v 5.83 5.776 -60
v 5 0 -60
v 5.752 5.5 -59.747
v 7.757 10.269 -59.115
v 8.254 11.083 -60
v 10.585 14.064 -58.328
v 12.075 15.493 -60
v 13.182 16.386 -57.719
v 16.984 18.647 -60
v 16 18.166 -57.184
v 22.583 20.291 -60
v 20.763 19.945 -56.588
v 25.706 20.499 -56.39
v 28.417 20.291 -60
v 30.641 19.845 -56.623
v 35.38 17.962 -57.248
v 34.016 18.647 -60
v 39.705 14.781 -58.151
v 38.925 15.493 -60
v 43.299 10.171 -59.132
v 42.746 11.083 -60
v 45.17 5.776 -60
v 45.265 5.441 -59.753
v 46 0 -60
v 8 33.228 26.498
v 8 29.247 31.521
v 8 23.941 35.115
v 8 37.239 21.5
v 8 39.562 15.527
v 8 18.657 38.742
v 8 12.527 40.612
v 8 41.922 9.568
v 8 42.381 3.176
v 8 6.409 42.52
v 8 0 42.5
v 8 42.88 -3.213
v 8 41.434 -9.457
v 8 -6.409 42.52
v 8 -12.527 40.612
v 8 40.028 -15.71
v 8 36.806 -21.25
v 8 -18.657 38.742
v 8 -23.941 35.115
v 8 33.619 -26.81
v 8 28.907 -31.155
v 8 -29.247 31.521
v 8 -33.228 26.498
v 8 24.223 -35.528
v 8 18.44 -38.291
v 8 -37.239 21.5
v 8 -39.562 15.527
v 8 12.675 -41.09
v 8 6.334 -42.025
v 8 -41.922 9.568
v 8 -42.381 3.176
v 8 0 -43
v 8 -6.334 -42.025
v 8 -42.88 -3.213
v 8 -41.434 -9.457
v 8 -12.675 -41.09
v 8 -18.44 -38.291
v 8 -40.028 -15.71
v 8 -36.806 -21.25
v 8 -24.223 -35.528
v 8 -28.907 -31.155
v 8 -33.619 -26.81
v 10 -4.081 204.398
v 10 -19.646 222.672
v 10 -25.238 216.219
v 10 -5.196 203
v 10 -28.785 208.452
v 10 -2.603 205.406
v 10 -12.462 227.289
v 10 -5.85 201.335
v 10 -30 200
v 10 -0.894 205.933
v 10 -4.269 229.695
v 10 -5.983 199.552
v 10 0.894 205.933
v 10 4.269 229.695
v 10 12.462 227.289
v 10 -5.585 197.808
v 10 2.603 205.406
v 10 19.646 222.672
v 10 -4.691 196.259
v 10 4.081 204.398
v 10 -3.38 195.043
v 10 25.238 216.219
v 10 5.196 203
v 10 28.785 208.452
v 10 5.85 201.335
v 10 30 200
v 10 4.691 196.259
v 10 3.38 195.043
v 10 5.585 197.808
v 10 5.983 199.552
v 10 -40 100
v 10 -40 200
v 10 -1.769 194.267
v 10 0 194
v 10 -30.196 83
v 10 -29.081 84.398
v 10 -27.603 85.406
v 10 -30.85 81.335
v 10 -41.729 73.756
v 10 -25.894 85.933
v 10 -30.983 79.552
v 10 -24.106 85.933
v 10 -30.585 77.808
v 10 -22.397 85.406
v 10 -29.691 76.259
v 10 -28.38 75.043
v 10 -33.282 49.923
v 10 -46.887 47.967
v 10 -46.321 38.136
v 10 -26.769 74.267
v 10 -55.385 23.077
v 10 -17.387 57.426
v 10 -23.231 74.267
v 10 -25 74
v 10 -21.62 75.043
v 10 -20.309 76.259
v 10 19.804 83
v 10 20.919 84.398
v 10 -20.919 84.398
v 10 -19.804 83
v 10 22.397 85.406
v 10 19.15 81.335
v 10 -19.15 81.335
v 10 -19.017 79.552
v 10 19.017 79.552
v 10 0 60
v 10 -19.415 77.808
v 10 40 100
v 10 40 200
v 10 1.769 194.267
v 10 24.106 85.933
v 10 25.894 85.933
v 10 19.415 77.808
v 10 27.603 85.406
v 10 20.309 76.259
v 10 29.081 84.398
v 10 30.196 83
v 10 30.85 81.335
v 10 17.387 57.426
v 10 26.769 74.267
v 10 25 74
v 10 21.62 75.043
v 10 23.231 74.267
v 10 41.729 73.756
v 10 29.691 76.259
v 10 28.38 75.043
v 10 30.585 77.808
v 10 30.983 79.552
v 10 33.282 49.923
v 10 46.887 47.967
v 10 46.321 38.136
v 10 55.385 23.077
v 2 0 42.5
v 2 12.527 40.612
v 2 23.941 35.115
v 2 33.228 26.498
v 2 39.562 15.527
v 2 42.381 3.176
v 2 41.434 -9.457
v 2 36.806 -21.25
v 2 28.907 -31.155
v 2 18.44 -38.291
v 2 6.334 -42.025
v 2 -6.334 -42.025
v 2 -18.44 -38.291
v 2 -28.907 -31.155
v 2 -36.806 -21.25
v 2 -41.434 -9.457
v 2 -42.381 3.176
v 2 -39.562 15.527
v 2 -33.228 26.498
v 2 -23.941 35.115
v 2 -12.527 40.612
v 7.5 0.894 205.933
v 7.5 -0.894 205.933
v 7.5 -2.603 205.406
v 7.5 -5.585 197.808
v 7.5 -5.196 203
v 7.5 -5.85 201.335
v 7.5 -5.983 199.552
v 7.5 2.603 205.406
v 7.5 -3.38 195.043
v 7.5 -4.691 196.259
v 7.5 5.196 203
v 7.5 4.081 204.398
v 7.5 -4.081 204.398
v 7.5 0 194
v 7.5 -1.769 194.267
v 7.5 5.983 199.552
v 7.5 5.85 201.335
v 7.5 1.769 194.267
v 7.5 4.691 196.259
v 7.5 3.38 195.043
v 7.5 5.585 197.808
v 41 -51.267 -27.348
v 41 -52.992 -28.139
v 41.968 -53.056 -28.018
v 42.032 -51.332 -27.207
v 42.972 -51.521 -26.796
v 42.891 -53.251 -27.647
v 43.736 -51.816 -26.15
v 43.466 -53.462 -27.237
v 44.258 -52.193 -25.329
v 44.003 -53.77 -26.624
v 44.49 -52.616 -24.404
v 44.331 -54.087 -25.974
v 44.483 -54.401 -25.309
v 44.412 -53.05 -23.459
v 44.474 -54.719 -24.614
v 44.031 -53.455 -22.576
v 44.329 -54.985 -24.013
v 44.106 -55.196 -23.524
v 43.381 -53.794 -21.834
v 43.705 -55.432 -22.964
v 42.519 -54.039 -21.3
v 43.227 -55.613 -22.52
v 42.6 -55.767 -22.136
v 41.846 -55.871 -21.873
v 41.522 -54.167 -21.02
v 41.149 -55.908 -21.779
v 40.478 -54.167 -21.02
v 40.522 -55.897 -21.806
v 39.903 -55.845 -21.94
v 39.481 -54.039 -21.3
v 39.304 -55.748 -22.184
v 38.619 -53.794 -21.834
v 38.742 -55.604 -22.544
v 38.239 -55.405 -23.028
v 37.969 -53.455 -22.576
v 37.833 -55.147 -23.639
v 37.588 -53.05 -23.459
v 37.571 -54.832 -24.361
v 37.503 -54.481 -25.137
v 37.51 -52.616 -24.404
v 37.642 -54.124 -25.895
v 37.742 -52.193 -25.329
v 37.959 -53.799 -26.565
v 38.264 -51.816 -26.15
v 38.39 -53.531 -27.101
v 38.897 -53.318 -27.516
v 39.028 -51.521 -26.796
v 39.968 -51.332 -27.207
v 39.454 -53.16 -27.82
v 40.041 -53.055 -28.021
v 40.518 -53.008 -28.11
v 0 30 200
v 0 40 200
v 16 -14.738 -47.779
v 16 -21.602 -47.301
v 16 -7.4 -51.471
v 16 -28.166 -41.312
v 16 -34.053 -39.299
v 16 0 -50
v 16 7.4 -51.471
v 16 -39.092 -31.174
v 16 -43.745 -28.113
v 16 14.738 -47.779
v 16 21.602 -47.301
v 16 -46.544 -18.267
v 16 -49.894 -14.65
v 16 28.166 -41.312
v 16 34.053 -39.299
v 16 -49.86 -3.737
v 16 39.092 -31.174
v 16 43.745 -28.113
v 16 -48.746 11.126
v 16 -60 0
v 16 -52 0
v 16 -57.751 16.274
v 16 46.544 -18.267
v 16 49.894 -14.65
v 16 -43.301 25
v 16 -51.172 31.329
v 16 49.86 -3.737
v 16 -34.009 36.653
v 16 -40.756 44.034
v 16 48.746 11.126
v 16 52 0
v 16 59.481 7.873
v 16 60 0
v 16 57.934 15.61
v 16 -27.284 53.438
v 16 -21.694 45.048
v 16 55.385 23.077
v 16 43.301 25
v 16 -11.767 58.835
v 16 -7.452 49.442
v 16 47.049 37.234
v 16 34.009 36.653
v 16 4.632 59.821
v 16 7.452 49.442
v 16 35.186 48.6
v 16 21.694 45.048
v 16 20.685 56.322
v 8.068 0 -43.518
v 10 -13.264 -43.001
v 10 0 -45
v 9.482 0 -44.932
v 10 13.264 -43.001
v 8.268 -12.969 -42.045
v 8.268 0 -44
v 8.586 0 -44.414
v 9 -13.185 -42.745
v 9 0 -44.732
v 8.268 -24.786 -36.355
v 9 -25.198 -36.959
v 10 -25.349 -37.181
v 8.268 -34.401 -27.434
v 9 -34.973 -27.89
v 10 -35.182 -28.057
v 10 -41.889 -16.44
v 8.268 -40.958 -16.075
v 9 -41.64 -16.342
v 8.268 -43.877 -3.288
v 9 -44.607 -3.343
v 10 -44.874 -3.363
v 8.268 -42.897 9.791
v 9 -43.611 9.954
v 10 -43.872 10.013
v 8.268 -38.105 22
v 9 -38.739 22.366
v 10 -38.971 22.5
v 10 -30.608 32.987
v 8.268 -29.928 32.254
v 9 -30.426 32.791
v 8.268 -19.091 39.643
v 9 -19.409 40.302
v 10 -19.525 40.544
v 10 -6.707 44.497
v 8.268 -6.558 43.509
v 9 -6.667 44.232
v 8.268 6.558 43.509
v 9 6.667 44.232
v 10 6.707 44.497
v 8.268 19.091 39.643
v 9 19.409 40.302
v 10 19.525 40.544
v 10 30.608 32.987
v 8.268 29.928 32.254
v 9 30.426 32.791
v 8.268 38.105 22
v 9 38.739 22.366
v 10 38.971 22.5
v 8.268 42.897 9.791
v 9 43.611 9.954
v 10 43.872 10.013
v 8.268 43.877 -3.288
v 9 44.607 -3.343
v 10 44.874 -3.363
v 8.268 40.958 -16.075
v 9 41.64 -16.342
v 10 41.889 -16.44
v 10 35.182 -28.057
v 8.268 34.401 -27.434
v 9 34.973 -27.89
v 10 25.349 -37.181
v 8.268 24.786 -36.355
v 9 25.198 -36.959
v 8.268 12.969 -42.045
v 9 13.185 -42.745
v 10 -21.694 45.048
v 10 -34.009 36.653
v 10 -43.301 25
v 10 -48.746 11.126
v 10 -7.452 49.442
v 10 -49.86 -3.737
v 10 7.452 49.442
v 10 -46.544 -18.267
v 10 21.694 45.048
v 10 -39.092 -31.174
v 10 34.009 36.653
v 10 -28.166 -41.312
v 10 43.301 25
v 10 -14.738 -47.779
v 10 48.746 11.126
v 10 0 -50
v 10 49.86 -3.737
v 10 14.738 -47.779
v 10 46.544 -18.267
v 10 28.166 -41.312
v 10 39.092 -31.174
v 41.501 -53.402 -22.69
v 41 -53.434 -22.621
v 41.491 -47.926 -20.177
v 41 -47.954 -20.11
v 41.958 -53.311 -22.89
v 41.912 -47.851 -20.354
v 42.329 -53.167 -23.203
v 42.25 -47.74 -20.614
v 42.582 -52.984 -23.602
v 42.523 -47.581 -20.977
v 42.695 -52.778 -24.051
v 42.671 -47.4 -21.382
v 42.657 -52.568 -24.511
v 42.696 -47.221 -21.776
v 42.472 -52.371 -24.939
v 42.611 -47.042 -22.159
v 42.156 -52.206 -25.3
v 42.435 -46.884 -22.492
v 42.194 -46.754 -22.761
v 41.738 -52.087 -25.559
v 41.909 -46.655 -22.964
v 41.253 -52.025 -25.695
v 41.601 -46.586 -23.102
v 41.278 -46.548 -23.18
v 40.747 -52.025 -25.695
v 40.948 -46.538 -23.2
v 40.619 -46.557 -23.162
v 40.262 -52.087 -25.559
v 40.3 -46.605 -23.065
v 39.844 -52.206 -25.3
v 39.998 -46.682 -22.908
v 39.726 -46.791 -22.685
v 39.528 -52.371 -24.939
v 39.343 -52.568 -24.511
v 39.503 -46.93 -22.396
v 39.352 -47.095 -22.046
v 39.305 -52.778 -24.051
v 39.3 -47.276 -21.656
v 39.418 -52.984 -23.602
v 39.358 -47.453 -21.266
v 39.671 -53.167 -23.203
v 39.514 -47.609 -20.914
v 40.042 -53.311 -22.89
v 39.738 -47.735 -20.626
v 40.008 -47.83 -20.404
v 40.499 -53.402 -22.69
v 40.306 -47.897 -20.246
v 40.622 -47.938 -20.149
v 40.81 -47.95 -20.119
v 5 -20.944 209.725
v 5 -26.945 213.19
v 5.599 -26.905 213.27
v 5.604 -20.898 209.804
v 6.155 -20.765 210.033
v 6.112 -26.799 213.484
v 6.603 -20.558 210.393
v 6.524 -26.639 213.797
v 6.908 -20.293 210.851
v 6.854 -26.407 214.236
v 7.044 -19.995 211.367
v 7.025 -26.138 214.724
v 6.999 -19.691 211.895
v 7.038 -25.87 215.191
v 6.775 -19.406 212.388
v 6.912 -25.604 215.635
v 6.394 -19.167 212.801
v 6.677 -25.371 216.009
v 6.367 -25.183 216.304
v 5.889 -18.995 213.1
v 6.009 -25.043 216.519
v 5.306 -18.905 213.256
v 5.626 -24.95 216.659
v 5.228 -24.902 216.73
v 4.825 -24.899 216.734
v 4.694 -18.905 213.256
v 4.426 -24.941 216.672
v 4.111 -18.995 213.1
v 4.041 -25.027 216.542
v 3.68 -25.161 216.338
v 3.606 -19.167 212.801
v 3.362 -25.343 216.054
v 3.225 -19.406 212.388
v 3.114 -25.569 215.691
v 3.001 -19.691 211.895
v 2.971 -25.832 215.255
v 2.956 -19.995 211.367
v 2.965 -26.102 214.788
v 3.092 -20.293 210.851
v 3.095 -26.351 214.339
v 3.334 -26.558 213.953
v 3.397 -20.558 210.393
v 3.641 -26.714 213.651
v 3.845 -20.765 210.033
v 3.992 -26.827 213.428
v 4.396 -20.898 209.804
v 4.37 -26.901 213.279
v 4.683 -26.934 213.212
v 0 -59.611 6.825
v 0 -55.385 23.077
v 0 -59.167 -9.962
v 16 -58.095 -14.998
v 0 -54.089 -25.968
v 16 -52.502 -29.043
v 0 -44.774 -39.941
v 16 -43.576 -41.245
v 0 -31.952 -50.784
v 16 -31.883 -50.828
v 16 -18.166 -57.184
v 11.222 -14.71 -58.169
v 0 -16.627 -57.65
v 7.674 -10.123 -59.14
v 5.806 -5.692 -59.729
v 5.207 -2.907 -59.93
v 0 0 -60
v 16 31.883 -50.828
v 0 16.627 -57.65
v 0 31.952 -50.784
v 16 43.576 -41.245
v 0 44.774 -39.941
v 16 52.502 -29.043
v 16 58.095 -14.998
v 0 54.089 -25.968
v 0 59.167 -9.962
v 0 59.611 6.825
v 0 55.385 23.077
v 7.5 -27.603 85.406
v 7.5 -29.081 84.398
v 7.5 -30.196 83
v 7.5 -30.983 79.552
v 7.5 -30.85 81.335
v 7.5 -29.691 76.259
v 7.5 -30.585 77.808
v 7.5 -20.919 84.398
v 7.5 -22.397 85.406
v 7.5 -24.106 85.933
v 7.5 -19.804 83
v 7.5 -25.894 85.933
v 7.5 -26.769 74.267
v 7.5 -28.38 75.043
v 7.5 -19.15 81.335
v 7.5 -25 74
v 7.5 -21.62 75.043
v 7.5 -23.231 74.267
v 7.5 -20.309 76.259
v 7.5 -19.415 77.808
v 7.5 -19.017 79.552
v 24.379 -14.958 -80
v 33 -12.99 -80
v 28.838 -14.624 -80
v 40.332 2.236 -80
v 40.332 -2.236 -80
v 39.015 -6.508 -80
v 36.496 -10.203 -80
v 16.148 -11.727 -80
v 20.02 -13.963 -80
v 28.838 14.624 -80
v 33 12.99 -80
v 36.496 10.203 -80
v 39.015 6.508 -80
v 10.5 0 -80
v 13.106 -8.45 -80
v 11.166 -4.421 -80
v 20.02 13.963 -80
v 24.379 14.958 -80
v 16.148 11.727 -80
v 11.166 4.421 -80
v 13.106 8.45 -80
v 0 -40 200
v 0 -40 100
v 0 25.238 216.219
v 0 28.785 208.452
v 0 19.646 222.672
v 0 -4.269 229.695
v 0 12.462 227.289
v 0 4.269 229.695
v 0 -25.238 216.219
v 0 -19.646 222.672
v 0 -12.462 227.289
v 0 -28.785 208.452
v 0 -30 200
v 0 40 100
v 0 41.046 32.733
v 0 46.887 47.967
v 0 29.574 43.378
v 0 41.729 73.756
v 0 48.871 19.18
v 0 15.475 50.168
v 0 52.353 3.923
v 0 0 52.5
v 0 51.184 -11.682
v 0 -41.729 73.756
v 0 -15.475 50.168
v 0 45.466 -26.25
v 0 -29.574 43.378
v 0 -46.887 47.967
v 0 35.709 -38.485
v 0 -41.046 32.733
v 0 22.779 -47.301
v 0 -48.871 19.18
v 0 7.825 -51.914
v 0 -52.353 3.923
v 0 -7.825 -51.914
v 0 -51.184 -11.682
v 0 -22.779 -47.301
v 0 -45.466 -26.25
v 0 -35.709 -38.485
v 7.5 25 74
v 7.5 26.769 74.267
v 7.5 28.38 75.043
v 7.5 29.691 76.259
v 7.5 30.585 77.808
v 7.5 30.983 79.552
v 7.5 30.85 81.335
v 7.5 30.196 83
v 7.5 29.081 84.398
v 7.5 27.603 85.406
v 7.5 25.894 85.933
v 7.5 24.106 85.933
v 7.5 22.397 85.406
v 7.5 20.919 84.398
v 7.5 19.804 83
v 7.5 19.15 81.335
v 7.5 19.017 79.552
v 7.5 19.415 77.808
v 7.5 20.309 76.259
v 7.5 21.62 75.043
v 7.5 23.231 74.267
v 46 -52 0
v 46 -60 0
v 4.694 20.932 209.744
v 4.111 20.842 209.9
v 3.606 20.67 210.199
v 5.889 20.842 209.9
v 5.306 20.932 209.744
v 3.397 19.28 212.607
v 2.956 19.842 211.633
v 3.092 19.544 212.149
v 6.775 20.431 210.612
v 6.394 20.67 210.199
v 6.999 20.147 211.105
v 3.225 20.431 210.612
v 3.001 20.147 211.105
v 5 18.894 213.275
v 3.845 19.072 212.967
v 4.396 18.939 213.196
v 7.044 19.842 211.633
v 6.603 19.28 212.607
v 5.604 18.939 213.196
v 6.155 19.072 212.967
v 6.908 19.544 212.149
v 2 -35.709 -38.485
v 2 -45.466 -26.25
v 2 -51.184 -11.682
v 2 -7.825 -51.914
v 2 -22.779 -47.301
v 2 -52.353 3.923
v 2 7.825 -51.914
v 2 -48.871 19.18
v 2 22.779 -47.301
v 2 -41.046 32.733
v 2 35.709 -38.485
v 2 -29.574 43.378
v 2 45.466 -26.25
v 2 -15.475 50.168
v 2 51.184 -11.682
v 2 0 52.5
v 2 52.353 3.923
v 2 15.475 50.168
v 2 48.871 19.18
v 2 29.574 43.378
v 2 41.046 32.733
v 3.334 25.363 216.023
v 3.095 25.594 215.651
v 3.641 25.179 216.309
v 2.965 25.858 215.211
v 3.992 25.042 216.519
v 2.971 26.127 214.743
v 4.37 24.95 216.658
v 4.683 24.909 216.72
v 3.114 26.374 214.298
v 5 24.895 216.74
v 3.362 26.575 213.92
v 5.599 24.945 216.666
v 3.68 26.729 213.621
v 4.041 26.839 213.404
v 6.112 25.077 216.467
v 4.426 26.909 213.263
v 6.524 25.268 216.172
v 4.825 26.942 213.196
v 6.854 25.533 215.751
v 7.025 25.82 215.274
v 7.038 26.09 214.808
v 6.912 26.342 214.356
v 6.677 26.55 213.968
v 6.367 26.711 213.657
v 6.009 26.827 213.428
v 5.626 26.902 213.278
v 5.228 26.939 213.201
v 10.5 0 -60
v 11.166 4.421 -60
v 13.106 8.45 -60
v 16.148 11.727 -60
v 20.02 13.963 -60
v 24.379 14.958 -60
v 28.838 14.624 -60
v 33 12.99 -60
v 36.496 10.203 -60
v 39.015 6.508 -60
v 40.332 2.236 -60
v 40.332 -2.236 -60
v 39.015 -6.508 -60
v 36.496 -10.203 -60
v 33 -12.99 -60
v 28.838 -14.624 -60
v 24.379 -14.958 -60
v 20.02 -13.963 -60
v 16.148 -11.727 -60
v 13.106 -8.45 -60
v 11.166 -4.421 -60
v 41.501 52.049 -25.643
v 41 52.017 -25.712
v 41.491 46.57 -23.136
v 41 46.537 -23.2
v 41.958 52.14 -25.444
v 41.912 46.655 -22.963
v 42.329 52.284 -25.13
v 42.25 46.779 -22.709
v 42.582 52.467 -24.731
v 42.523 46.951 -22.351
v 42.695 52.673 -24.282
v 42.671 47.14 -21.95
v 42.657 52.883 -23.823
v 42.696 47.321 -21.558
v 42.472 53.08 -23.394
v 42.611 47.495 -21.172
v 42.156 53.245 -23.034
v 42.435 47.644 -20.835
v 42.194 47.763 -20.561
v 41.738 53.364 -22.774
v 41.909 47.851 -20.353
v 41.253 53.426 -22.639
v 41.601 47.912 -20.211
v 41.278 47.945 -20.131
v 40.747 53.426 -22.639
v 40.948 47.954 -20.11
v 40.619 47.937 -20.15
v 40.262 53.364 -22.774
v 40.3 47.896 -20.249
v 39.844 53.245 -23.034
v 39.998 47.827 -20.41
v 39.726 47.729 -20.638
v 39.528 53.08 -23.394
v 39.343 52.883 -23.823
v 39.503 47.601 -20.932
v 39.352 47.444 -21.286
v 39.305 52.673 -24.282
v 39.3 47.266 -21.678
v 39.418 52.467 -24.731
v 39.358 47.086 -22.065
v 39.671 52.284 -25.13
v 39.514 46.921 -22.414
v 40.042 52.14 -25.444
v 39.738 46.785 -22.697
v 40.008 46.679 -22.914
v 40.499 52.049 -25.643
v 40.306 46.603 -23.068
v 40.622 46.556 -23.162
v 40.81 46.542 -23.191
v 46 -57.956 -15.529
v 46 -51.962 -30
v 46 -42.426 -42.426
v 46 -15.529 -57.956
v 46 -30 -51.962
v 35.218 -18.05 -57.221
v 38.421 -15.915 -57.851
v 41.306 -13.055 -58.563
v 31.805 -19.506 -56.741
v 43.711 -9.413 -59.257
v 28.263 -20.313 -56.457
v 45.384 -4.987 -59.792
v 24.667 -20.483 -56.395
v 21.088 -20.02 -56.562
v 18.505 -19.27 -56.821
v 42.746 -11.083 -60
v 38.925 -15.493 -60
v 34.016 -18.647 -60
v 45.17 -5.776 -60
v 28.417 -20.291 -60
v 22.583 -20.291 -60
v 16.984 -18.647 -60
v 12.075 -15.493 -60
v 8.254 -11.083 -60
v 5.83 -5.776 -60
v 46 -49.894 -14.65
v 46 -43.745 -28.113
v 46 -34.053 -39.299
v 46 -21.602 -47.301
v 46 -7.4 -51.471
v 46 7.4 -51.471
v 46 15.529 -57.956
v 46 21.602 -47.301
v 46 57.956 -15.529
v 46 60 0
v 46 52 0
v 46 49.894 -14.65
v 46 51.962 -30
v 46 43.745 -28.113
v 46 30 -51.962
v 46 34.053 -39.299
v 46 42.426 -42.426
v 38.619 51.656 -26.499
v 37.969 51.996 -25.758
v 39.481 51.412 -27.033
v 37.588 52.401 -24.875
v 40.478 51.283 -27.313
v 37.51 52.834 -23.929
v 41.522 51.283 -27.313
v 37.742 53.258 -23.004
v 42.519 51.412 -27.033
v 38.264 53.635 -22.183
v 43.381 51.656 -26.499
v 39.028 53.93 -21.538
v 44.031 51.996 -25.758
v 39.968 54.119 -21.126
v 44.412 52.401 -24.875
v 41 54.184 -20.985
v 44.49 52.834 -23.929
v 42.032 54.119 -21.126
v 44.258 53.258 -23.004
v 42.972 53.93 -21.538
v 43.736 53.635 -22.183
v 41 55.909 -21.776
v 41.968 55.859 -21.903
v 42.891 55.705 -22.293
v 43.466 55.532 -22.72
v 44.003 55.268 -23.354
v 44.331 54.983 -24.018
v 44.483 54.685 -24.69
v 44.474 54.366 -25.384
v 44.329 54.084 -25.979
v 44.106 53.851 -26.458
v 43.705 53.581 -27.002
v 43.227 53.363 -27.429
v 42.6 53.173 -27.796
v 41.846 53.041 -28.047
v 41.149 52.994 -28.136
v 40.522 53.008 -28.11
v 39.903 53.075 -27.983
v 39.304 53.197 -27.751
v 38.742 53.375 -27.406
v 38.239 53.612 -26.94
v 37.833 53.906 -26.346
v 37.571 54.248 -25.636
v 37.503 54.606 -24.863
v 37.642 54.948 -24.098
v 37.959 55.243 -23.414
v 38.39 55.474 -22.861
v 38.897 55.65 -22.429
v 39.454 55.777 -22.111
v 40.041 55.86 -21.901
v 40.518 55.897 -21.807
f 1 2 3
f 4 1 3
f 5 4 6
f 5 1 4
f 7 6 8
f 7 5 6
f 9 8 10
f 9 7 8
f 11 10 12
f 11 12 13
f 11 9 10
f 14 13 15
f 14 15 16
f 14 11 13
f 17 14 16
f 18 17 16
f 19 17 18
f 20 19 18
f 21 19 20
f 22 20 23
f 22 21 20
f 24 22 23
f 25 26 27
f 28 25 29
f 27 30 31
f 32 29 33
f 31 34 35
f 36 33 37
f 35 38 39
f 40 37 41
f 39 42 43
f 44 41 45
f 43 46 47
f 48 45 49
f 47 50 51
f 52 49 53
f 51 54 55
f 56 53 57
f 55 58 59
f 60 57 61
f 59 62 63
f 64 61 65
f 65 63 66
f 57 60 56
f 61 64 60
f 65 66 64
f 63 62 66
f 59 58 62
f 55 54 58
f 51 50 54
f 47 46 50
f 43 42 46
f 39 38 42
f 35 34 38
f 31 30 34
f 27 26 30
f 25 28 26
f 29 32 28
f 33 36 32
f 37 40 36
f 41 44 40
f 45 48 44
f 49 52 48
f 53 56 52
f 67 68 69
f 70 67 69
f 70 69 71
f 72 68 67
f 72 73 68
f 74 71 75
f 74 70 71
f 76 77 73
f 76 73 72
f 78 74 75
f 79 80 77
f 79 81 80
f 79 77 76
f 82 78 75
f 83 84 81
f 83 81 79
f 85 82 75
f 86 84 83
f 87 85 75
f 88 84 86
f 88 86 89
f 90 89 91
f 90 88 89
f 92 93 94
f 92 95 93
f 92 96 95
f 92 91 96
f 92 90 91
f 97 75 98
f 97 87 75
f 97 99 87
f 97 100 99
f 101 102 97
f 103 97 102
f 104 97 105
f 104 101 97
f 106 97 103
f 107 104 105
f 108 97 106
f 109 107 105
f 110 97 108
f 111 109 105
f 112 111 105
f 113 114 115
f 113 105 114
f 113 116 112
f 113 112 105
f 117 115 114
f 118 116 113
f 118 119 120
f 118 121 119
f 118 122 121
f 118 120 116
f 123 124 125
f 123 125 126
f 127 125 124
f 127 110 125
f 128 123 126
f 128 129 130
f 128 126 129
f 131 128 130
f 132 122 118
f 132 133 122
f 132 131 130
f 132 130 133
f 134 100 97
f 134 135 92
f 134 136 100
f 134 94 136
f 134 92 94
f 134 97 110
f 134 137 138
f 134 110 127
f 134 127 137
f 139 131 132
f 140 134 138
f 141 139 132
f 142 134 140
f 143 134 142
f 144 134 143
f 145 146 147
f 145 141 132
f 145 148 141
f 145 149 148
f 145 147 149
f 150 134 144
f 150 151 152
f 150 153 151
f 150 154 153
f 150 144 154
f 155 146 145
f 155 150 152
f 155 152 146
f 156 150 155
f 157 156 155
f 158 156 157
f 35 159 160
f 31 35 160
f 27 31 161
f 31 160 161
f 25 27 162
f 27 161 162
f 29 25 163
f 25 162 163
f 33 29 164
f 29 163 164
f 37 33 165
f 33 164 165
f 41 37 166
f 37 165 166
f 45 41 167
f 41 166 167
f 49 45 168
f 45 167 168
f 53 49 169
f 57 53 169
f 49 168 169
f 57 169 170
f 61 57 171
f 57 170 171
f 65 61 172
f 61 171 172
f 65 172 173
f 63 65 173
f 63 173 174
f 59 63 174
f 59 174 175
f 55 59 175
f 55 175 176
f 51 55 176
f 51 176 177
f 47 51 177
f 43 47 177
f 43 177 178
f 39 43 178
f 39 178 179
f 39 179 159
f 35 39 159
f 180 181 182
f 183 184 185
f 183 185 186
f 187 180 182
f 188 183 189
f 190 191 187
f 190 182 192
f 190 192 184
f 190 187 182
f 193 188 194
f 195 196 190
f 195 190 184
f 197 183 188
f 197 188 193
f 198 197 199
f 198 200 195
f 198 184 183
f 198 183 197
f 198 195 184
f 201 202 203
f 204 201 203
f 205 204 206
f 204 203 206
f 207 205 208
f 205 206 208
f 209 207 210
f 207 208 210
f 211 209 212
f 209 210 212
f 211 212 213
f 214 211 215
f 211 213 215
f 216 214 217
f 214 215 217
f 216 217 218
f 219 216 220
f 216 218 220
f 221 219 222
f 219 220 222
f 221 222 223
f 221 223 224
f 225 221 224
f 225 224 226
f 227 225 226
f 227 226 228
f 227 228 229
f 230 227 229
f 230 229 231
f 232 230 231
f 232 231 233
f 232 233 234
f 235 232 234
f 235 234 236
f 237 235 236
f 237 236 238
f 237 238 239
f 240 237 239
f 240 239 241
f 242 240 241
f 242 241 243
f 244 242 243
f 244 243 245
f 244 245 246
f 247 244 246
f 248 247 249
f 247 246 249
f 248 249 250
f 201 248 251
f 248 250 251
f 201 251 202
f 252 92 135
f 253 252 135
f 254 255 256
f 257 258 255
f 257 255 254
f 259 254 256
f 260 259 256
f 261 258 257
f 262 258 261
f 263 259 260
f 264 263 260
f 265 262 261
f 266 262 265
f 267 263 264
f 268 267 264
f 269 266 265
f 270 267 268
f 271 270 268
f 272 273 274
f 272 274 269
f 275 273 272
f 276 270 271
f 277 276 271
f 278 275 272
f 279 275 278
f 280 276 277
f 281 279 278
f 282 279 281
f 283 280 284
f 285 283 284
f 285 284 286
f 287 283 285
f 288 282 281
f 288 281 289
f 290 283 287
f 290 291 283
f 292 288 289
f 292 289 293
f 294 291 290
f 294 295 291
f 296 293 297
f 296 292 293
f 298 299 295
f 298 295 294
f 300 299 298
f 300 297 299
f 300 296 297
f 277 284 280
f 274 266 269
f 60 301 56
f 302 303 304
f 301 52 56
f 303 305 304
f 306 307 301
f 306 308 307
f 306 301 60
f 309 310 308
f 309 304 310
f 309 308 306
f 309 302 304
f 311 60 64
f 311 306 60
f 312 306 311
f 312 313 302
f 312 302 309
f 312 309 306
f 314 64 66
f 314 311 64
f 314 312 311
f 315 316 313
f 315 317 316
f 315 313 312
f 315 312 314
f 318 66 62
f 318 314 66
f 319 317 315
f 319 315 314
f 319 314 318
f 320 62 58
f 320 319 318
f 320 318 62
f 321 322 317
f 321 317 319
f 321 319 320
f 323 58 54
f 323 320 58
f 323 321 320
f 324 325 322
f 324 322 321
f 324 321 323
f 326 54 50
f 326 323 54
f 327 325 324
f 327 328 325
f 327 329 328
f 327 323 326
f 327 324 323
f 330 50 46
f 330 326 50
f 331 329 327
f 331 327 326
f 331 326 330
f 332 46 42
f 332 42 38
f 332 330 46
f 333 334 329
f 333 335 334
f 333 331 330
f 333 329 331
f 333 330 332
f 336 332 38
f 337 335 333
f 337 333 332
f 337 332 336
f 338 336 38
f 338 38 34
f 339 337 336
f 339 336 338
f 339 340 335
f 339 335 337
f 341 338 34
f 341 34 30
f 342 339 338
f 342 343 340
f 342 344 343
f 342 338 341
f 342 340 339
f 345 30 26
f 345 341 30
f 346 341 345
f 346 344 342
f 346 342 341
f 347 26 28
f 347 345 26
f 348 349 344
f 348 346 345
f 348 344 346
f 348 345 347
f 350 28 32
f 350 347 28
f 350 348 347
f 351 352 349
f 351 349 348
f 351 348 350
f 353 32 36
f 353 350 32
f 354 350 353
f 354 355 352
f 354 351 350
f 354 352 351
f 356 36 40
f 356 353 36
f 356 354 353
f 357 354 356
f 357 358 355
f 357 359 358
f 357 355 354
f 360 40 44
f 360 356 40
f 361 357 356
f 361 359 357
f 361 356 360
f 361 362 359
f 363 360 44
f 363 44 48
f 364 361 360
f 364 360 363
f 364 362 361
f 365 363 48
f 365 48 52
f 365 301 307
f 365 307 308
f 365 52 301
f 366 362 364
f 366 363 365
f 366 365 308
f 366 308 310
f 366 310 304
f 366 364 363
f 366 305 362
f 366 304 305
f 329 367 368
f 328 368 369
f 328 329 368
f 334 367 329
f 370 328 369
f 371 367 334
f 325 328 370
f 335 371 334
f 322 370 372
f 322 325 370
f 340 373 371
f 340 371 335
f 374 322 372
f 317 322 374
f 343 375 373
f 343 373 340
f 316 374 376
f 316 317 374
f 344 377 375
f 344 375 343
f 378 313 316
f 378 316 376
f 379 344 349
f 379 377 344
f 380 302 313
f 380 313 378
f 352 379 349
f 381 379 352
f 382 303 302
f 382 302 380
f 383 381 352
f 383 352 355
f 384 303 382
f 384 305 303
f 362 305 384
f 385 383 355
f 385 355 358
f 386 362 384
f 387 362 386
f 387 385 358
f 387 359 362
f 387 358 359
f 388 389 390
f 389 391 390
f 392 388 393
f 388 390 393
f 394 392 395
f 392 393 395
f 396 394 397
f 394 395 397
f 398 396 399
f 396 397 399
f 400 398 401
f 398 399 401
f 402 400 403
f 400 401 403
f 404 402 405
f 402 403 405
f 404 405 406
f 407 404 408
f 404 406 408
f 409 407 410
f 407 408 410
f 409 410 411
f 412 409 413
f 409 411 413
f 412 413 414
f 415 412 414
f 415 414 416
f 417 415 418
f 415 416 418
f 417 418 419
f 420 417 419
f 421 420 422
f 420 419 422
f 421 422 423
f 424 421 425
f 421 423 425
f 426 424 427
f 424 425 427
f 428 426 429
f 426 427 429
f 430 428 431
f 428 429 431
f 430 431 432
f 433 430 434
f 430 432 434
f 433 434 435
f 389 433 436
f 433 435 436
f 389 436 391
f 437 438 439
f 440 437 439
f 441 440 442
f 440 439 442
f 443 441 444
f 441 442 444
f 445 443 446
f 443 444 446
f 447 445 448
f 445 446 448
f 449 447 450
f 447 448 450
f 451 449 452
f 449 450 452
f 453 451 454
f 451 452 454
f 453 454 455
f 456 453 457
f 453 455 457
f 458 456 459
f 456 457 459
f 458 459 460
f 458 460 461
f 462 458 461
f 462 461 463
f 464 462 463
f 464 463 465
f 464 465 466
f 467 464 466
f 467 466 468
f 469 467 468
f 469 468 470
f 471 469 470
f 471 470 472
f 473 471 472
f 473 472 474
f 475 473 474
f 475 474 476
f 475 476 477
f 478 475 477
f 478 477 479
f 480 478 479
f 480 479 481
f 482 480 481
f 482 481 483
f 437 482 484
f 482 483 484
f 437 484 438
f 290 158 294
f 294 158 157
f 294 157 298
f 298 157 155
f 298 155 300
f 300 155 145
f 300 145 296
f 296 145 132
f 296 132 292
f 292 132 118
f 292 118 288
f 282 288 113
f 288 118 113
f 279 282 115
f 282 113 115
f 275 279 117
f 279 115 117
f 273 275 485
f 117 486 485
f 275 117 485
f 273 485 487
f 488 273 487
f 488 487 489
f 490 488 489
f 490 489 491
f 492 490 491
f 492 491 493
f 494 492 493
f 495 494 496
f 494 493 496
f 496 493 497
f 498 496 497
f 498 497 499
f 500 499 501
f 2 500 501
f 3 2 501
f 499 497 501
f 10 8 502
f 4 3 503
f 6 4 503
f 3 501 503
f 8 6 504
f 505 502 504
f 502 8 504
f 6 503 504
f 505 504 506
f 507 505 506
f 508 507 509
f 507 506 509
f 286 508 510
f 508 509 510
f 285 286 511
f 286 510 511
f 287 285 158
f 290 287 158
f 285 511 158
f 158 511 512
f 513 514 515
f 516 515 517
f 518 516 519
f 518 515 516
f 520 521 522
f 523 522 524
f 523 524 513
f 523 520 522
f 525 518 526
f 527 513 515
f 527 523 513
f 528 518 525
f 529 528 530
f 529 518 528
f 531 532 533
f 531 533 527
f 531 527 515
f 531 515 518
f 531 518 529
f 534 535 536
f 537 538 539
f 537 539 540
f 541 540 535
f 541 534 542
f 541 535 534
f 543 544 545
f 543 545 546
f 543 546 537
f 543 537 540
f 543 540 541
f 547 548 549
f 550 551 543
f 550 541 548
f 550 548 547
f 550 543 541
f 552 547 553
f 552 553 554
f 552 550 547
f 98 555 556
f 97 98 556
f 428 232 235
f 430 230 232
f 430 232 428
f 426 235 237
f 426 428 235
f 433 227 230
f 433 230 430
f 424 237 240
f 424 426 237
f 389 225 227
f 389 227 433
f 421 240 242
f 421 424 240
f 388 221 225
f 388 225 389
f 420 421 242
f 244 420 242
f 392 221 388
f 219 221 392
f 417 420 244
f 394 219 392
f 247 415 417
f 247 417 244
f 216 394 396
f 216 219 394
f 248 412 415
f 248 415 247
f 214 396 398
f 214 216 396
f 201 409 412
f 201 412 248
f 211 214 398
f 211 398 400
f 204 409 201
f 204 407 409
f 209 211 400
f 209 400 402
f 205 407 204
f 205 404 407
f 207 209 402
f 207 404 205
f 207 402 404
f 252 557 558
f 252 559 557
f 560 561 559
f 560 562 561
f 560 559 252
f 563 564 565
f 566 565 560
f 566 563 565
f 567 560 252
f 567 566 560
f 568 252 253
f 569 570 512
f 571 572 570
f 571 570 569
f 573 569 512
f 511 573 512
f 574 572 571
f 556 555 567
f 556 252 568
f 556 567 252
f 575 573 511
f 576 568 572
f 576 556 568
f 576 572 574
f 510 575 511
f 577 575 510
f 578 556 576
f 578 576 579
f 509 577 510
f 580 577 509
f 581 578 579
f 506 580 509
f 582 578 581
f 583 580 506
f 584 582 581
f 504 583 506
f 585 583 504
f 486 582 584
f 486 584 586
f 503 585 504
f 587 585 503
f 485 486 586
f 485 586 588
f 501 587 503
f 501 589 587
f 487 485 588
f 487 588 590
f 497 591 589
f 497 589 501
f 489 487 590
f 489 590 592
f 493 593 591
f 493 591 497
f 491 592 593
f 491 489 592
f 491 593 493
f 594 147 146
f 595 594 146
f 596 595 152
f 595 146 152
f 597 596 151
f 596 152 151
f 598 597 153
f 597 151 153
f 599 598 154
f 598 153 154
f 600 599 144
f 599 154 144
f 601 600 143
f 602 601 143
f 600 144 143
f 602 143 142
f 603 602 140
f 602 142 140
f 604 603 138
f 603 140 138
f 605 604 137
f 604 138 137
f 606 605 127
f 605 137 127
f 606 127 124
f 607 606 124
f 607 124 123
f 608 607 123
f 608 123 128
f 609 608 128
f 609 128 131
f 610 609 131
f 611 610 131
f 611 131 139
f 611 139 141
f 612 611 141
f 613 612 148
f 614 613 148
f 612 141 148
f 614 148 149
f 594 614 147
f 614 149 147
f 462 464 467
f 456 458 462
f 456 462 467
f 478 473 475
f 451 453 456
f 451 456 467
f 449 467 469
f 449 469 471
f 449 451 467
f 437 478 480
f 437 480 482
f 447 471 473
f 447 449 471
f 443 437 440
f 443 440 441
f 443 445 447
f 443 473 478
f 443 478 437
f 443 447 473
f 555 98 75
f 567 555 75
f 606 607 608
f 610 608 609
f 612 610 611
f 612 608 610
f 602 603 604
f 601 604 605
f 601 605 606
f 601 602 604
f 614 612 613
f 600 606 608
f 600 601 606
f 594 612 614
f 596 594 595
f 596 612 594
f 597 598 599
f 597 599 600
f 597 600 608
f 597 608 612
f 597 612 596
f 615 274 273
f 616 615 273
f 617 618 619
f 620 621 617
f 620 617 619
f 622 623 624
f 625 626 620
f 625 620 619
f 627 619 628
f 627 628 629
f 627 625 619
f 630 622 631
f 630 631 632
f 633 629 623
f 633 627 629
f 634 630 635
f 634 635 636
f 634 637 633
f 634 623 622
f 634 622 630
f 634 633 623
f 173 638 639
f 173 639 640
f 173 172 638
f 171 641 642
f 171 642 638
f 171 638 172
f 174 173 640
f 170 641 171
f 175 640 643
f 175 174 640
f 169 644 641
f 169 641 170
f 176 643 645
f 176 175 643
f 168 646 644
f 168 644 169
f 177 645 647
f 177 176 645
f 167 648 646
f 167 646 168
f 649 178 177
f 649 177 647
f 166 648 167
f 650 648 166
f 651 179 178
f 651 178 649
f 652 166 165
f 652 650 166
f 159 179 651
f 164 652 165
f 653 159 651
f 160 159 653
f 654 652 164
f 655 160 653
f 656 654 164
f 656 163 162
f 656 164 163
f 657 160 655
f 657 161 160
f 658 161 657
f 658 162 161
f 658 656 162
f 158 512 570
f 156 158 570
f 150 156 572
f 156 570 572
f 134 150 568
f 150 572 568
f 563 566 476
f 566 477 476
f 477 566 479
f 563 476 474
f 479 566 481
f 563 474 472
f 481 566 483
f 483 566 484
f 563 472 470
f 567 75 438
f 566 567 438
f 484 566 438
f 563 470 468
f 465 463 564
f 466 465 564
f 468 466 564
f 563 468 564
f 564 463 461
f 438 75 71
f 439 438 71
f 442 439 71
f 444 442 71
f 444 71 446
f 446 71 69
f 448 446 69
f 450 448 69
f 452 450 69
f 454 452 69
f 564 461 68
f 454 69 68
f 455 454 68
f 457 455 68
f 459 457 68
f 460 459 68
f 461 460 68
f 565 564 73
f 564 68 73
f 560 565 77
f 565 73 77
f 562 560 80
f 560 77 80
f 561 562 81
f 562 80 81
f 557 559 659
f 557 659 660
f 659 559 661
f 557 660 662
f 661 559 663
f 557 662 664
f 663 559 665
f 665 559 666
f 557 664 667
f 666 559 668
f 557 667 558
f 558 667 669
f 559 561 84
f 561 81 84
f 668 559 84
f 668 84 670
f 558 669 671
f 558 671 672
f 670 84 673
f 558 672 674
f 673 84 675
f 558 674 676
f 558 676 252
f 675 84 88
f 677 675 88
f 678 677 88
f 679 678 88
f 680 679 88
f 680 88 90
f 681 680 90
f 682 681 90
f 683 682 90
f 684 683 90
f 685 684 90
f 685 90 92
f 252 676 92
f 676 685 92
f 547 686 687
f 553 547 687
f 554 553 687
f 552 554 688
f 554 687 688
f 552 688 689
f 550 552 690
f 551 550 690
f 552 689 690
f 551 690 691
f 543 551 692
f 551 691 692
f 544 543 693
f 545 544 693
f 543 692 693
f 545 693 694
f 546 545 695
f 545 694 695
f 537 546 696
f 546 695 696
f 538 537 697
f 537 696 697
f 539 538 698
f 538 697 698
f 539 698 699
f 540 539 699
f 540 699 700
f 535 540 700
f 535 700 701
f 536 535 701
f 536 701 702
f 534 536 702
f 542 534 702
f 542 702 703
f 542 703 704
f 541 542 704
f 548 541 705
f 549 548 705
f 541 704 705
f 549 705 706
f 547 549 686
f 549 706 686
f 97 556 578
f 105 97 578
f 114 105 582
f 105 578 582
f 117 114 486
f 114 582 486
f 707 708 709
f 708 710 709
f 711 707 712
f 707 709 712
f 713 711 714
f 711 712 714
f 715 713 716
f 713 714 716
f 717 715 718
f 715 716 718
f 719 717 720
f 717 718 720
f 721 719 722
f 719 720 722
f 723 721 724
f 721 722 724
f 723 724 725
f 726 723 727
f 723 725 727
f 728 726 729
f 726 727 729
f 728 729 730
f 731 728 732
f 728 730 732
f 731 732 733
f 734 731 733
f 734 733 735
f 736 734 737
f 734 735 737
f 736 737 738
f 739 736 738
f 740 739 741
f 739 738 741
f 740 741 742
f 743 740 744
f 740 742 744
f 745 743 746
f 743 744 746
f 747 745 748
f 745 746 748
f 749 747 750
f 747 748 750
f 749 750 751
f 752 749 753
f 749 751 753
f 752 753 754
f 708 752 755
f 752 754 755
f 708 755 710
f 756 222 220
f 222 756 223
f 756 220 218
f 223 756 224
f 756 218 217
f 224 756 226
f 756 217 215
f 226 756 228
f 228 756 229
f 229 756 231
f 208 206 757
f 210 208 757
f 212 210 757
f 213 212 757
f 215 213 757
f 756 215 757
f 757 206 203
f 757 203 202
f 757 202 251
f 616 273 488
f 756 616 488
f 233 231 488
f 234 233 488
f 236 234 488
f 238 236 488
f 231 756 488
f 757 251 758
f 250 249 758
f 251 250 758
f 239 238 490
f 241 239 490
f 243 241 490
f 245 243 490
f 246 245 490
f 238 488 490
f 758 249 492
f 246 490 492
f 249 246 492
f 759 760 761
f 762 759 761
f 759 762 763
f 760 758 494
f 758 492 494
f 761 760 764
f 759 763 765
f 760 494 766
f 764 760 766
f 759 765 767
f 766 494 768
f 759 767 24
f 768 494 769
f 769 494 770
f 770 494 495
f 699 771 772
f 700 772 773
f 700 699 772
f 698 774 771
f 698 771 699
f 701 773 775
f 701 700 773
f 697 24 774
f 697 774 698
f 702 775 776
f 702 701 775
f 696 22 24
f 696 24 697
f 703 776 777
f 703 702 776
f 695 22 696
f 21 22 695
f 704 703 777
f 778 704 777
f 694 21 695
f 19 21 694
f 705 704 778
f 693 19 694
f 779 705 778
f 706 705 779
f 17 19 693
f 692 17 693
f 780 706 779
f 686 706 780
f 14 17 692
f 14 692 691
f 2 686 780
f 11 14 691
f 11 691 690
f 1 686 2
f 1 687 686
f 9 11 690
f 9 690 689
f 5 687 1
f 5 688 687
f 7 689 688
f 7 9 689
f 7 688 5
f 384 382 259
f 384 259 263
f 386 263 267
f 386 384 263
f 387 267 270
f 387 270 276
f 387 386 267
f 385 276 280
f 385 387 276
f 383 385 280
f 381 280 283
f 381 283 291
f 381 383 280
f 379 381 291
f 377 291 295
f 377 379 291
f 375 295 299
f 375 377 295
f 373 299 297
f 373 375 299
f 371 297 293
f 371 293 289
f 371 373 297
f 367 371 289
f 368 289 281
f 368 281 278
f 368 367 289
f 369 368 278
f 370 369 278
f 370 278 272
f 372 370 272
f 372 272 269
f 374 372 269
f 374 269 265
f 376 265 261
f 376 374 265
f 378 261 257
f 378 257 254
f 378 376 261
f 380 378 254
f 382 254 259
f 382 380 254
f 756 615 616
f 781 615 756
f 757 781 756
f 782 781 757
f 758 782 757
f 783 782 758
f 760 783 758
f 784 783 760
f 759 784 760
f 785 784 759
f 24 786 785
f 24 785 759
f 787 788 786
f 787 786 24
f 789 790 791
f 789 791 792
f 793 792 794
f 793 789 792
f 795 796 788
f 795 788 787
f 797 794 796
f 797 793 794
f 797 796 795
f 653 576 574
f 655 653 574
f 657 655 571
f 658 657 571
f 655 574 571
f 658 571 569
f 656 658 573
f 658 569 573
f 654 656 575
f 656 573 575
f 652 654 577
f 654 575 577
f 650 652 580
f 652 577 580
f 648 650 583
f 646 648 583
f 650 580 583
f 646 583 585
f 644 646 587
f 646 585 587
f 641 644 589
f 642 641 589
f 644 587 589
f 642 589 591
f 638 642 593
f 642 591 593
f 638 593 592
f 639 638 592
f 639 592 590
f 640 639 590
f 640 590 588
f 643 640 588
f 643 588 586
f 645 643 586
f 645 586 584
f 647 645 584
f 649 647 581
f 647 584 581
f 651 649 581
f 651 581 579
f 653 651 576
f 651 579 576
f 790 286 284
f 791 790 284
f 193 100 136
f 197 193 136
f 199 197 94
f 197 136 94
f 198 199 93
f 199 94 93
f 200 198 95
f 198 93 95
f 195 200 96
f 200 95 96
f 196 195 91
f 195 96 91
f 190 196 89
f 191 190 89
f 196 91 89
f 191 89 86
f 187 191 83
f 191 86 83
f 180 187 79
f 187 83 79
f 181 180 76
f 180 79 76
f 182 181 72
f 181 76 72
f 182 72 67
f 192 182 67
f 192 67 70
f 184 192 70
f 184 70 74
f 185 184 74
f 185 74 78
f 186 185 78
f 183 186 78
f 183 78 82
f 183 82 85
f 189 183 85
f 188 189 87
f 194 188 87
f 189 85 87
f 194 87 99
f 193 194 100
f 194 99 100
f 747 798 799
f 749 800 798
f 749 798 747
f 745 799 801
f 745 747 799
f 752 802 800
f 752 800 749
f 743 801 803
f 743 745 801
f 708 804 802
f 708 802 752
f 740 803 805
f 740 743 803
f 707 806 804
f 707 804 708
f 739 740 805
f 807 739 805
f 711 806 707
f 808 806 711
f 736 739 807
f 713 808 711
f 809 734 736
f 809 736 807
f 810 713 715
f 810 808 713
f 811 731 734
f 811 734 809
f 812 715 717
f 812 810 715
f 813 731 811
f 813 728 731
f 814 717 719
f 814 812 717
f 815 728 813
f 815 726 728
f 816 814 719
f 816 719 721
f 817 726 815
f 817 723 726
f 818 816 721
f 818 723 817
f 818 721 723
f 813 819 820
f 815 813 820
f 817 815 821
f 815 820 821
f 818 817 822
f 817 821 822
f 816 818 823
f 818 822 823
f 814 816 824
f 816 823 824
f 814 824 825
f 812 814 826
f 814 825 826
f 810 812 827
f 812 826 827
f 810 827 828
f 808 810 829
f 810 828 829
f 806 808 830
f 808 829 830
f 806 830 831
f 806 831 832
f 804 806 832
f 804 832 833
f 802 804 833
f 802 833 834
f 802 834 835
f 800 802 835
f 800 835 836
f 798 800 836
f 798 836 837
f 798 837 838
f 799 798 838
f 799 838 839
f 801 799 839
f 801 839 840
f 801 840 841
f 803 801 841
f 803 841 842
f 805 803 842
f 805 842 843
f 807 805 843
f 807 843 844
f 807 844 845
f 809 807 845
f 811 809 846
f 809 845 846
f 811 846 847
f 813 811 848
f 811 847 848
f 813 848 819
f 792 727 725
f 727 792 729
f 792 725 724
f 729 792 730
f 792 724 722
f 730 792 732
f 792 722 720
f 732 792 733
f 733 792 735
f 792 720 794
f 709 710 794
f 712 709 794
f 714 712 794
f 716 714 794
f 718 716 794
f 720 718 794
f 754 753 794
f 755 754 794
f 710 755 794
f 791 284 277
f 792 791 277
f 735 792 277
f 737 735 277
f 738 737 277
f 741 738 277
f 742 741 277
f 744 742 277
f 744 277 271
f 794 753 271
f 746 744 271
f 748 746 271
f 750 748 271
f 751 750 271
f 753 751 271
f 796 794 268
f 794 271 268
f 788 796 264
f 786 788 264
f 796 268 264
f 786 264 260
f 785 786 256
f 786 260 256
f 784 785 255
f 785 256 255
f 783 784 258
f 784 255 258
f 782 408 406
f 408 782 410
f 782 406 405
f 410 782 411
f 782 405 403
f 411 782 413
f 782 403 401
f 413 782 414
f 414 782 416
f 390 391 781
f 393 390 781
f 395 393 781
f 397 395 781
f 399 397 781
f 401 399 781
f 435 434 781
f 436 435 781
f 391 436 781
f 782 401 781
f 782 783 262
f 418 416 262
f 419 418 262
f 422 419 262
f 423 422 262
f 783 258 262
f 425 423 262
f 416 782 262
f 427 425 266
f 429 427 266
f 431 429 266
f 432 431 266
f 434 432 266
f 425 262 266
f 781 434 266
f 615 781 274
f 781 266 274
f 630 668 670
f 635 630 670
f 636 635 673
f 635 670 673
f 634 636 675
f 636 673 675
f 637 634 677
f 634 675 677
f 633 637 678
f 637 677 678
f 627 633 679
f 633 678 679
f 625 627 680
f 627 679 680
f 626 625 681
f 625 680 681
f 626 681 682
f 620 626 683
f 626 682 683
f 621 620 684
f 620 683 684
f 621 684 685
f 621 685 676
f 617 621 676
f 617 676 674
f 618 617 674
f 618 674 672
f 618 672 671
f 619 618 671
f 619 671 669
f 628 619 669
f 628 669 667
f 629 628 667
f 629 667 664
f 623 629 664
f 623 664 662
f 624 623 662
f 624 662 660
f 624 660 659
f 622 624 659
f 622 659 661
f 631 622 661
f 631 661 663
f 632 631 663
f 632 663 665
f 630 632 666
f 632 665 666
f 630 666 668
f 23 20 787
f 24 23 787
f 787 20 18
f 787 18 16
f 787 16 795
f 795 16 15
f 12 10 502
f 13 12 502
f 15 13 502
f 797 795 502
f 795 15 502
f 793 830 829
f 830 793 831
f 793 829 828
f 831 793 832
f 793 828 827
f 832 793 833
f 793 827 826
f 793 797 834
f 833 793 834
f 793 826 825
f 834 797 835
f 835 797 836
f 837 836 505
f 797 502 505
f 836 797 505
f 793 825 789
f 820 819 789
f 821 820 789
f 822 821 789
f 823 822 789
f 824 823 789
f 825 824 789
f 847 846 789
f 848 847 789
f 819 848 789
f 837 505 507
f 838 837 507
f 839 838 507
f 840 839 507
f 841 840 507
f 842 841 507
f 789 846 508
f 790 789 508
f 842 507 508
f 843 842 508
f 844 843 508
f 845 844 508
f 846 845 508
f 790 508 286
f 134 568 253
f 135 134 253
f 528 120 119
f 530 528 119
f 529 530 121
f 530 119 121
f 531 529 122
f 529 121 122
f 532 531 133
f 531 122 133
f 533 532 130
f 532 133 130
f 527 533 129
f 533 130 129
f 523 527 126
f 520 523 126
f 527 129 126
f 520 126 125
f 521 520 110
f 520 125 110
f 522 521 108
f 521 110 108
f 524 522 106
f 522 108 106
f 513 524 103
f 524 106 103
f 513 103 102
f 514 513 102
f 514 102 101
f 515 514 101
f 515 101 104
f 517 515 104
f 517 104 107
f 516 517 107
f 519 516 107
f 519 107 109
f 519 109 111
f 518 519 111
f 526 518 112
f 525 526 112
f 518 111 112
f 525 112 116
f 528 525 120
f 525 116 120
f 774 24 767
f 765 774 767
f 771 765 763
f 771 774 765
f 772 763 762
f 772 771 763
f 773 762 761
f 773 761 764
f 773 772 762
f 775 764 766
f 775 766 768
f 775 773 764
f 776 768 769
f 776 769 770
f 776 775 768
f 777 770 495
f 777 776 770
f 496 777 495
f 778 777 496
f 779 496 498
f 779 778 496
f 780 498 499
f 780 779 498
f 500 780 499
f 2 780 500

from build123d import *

# Parameters (mm, degrees)
SKETCH1_R                                            = 60
SKETCH1_R_2                                          = 45
SKETCH1_R_3                                          = 40
BOSS_EXTRUDE3_DEPTH                                  = 10
SKETCH4_R                                            = 60
SKETCH4_R_2                                          = 50
BOSS_EXTRUDE4_DEPTH                                  = 6
SKETCH5_R                                            = 45
SKETCH5_R_2                                          = 42.5
BOSS_EXTRUDE5_DEPTH                                  = 8
FILLET1_R                                            = 2
SKETCH6_R                                            = 52.5
SKETCH6_R_2                                          = 42.5
CUT_EXTRUDE2_DEPTH                                   = 2
BOSS_EXTRUDE6_DEPTH                                  = 30
BOSS_EXTRUDE7_REACH                                  = 311.38
SKETCH8_R                                            = 20.5
SKETCH9_R                                            = 15
BOSS_EXTRUDE8_DEPTH                                  = 20
CUT_EXTRUDE3_DEPTH                                   = 250.99199991
CBORE_FOR_M3_HEXAGON_HEAD_BOLTS_FULL_THR_D           = 3.4
CBORE_FOR_M3_HEXAGON_HEAD_BOLTS_FULL_THR_CBORE_D     = 7
CBORE_FOR_M3_HEXAGON_HEAD_BOLTS_FULL_THR_CBORE_DEPTH = 2
CBORE_FOR_M3_HEXAGON_HEAD_BOLTS_FULL_2_D             = 3.4
CBORE_FOR_M3_HEXAGON_HEAD_BOLTS_FULL_2_CBORE_D       = 7
CBORE_FOR_M3_HEXAGON_HEAD_BOLTS_FULL_2_CBORE_DEPTH   = 2
SKETCH17_R                                           = 2.05
CUT_EXTRUDE4_DEPTH                                   = 15
SKETCH18_R                                           = 2.05
CUT_EXTRUDE5_DEPTH                                   = 15
SKETCH19_R                                           = 6
CUT_EXTRUDE6_DEPTH                                   = 2.5
SKETCH20_R                                           = 6
CUT_EXTRUDE7_DEPTH                                   = 2.5


with BuildPart() as part:
    # Sketch1 → Boss-Extrude3 (new body)
    # profile 1 of 3: a face of its own
    with BuildSketch(Plane(origin=(0, 0, 0), x_dir=(0, 0, -1), z_dir=(1, 0, 0))):
        Circle(SKETCH1_R)
        Circle(SKETCH1_R_2, mode=Mode.SUBTRACT)
    # profile 2 of 3: a face of its own
    with BuildSketch(Plane(origin=(0, 0, 0), x_dir=(0, 0, -1), z_dir=(1, 0, 0))):
        with BuildLine():
            ThreePointArc((-23.076923077, 55.384615385), (-60.776772972, 43.883864862), (-100, 40))
            Line((-100, 40), (-200, 40))
            ThreePointArc((-200, 40), (-171.715728753, 28.284271247), (-160, 0))
            ThreePointArc((-160, 0), (-171.715728753, -28.284271247), (-200, -40))
            Line((-200, -40), (-100, -40))
            ThreePointArc((-100, -40), (-60.776772972, -43.883864862), (-23.076923077, -55.384615385))
            ThreePointArc((-23.076923077, -55.384615385), (-60, 0), (-23.076923077, 55.384615385))
        make_face()
    # profile 3 of 3: a face of its own
    with BuildSketch(Plane(origin=(0, 0, 0), x_dir=(0, 0, -1), z_dir=(1, 0, 0))):
        with Locations((-200, 0)):
            Circle(SKETCH1_R_3)
    extrude(amount=BOSS_EXTRUDE3_DEPTH)

    # Sketch4 → Boss-Extrude4 (add)
    with BuildSketch(Plane(origin=(10, 0, 0), x_dir=(0, 0, -1), z_dir=(1, 0, 0))):
        with Locations(Location((0, 0, 0), (0, 0, 112.619864948))):
            Circle(SKETCH4_R)
        Circle(SKETCH4_R_2, mode=Mode.SUBTRACT)
    extrude(amount=BOSS_EXTRUDE4_DEPTH)

    # Sketch5 → Boss-Extrude5 (add)
    with BuildSketch(Plane.ZY):
        with Locations(Location((0, 0, 0), (0, 0, 180))):
            Circle(SKETCH5_R)
        Circle(SKETCH5_R_2, mode=Mode.SUBTRACT)
    extrude(amount=-BOSS_EXTRUDE5_DEPTH)

    # Fillet1
    fillet1_edges = [part.edges().sort_by_distance(p)[0] for p in [
        (8, 0, 45),
    ]]
    fillet(fillet1_edges, radius=FILLET1_R - 0.0001)  # a hair under: the kernel refuses the full size

    # Sketch6 → Cut-Extrude2 (cut)
    with BuildSketch(Plane.ZY):
        Circle(SKETCH6_R)
        Circle(SKETCH6_R_2, mode=Mode.SUBTRACT)
    extrude(amount=-CUT_EXTRUDE2_DEPTH, mode=Mode.SUBTRACT)

    # Sketch7 → Boss-Extrude6 (add)
    with BuildSketch(Plane(origin=(16, 0, 0), x_dir=(0, 0, -1), z_dir=(1, 0, 0))):
        with BuildLine():
            ThreePointArc((60, 0), (42.426406871, 42.426406871), (0, 60))
            Line((0, 60), (0, 52))
            ThreePointArc((0, 52), (52, 0), (0, -52))
            Line((0, -52), (0, -60))
            ThreePointArc((0, -60), (42.426406871, -42.426406871), (60, 0))
        make_face()
    extrude(amount=BOSS_EXTRUDE6_DEPTH)

    # Sketch8 → Boss-Extrude7 (add, up to next)
    with BuildSketch(Plane(origin=(0, 0, -60), x_dir=(-1, 0, 0), z_dir=(0, 0, -1)), mode=Mode.PRIVATE) as boss_extrude7_sk1:
        with Locations((-25.5, 0)):
            Circle(SKETCH8_R)
    boss_extrude7_tool1 = extrude(boss_extrude7_sk1.sketch, amount=-BOSS_EXTRUDE7_REACH, mode=Mode.PRIVATE) - part.part
    add(boss_extrude7_tool1.solids().sort_by_distance((25.5, 0, -60))[0])
    add(boss_extrude7_tool1.solids().sort_by_distance((25.5, 0, -60))[1])

    # Sketch9 → Boss-Extrude8 (add)
    with BuildSketch(Plane(origin=(0, 0, -60), x_dir=(-1, 0, 0), z_dir=(0, 0, -1))):
        with Locations((-25.5, 0)):
            Circle(SKETCH9_R)
    extrude(amount=BOSS_EXTRUDE8_DEPTH)

    # Sketch12 → Cut-Extrude3 (cut, through all)
    with BuildSketch(Plane(origin=(10, 0, 0), x_dir=(0, 0, -1), z_dir=(1, 0, 0))):
        with BuildLine():
            Line((-200, 30), (-200, 40))
            ThreePointArc((-200, 40), (-240, 0), (-200, -40))
            Line((-200, -40), (-200, -30))
            ThreePointArc((-200, -30), (-230, 0), (-200, 30))
        make_face()
    extrude(amount=-CUT_EXTRUDE3_DEPTH, mode=Mode.SUBTRACT)

    # CBORE for M3 Hexagon head bolts-Full thread-grades AB2 (through all)
    with Locations(Plane(origin=(41, 54.543560573, -25), x_dir=(0, 0.416666666667, 0.909059342886), z_dir=(0, 0.909059342886, -0.416666666667))):
        with Locations((0, 0)):
            CounterBoreHole(CBORE_FOR_M3_HEXAGON_HEAD_BOLTS_FULL_THR_D / 2, CBORE_FOR_M3_HEXAGON_HEAD_BOLTS_FULL_THR_CBORE_D / 2, CBORE_FOR_M3_HEXAGON_HEAD_BOLTS_FULL_THR_CBORE_DEPTH)

    # CBORE for M3 Hexagon head bolts-Full 2 (through all)
    with Locations(Plane(origin=(41, -54.543560573, -25), x_dir=(0, 0.416667072006, -0.909059157099), z_dir=(0, -0.909059157099, -0.416667072006))):
        with Locations((0, 0)):
            CounterBoreHole(CBORE_FOR_M3_HEXAGON_HEAD_BOLTS_FULL_2_D / 2, CBORE_FOR_M3_HEXAGON_HEAD_BOLTS_FULL_2_CBORE_D / 2, CBORE_FOR_M3_HEXAGON_HEAD_BOLTS_FULL_2_CBORE_DEPTH)

    # Sketch17 → Cut-Extrude4 (cut)
    with BuildSketch(Plane(origin=(0, -119.511505722, 69), x_dir=(-1, 0, 0), z_dir=(0, -0.8660254037844414, 0.49999999999999517))):
        with Locations(Location((-5, -173.205080757, 0), (0, 0, 90))):
            Circle(SKETCH17_R)
    extrude(amount=-CUT_EXTRUDE4_DEPTH, mode=Mode.SUBTRACT)

    # Sketch18 → Cut-Extrude5 (cut)
    with BuildSketch(Plane(origin=(0, 119.511505722, 69), x_dir=(1, 0, 0), z_dir=(0, 0.8660254037844414, 0.49999999999999517))):
        with Locations(Location((5, -173.205080757, 0), (0, 0, 270))):
            Circle(SKETCH18_R)
    extrude(amount=-CUT_EXTRUDE5_DEPTH, mode=Mode.SUBTRACT)

    # Sketch19 → Cut-Extrude6 (cut)
    with BuildSketch(Plane(origin=(10, 0, 0), x_dir=(0, 0, -1), z_dir=(1, 0, 0))):
        with Locations((-200, 0)):
            Circle(SKETCH19_R)
    extrude(amount=-CUT_EXTRUDE6_DEPTH, mode=Mode.SUBTRACT)

    # Sketch20 → Cut-Extrude7 (cut)
    with BuildSketch(Plane(origin=(10, 0, 0), x_dir=(0, 0, -1), z_dir=(1, 0, 0))):
        with Locations((-80, -25)):
            Circle(SKETCH20_R)
        with Locations((-80, 25)):
            Circle(SKETCH20_R)
    extrude(amount=-CUT_EXTRUDE7_DEPTH, mode=Mode.SUBTRACT)


solid = part.part
